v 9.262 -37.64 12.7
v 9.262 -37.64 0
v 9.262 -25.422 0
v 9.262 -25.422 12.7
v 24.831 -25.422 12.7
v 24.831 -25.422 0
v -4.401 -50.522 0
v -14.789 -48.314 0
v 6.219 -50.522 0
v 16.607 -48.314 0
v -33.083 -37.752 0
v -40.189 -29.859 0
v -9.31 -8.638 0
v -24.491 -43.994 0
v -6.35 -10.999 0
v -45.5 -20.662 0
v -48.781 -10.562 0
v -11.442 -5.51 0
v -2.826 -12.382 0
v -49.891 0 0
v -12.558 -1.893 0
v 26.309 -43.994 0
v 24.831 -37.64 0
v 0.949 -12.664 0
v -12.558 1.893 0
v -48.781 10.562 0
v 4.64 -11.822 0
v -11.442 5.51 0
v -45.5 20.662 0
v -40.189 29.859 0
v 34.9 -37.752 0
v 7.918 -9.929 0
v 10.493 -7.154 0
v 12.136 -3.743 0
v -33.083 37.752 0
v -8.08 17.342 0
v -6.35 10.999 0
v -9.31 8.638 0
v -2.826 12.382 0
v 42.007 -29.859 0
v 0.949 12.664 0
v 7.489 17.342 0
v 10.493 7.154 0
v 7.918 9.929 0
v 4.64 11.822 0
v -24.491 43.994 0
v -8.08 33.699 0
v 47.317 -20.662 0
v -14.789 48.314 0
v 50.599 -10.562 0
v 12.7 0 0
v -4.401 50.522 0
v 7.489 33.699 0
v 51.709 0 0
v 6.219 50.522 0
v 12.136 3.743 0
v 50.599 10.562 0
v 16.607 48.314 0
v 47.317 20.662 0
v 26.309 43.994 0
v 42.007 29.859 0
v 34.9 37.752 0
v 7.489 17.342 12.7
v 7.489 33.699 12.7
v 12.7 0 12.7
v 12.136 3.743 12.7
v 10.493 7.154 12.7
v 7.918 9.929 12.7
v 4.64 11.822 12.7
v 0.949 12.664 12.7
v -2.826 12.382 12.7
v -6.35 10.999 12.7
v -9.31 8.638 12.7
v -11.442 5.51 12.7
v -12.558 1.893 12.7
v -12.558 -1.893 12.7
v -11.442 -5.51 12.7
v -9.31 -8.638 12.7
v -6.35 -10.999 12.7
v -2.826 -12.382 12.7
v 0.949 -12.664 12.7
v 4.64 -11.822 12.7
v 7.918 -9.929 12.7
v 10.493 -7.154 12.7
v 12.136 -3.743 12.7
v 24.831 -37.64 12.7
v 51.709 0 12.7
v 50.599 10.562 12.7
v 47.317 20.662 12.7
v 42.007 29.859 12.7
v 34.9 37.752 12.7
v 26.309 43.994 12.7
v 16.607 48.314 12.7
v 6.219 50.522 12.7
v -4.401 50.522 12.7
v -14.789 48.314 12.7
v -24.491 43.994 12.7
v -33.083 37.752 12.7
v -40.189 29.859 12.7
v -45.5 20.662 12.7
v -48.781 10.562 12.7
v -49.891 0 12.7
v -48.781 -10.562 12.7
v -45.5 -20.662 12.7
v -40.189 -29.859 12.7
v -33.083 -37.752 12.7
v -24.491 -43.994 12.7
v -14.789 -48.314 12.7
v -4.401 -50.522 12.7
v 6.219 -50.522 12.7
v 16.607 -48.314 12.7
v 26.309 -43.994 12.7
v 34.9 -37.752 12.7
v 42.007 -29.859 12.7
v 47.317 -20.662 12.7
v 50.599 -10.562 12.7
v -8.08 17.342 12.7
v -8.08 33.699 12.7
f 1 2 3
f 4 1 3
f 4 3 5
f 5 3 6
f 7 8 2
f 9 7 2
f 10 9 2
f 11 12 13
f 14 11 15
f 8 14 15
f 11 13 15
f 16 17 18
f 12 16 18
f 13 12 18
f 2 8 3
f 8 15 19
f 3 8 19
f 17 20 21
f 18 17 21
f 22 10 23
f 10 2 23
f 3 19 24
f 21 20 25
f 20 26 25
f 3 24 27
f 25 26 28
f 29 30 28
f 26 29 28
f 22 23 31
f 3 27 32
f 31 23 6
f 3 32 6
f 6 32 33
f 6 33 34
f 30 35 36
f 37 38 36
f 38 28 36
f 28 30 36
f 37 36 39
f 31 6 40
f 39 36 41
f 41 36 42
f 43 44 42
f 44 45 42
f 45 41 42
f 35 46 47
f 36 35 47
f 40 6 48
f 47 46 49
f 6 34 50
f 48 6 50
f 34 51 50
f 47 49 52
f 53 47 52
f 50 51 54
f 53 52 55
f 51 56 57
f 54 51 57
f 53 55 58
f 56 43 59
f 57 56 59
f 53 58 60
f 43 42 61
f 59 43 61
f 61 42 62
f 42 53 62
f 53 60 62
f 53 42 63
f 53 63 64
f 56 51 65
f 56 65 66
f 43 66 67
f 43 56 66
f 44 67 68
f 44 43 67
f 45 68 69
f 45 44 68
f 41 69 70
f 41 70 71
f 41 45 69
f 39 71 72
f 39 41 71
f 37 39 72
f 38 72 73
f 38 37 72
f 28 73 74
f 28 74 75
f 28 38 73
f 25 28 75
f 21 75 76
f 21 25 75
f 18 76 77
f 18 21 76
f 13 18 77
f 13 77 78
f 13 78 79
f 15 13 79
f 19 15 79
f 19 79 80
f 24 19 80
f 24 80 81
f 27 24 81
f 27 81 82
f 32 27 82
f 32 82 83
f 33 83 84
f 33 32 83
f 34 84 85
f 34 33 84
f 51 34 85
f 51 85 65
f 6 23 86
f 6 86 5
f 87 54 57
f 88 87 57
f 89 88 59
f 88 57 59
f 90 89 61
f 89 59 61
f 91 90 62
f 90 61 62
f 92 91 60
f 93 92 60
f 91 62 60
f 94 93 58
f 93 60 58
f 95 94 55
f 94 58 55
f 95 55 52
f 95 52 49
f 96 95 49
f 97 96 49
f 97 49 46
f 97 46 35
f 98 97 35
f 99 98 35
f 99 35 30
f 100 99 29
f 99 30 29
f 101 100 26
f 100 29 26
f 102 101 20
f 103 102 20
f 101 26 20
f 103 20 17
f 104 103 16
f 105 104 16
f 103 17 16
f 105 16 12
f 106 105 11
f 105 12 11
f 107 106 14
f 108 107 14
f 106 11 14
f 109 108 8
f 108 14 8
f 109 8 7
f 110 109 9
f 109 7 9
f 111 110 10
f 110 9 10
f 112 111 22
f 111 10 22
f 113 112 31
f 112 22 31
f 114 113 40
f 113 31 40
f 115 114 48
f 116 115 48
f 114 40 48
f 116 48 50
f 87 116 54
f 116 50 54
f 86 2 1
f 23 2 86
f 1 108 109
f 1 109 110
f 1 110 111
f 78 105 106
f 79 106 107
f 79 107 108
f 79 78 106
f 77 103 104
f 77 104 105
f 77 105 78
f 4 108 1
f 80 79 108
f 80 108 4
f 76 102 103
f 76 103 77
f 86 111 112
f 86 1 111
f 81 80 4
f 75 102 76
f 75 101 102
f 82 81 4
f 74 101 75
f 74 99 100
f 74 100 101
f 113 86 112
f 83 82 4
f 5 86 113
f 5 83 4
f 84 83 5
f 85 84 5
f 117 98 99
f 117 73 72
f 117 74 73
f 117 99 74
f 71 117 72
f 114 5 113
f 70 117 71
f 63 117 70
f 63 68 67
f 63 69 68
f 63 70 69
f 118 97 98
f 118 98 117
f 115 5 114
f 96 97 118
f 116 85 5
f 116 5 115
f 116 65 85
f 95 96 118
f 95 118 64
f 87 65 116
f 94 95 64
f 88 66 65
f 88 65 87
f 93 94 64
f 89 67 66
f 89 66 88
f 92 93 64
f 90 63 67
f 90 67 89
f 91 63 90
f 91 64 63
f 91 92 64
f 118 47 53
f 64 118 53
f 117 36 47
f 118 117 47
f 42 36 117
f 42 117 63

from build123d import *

# Parameters (mm, degrees)
F0_R     = 50.8
F0_R_2   = 12.7
F0_W     = 15.568451
F0_H     = 12.218274
F0_W_2   = 15.568449
F0_H_2   = 16.356724
F1_DEPTH = 12.7


with BuildPart() as f1:
    # F0 (on Top) → F1 (new body)
    with BuildSketch(Plane.XY):
        with Locations((0.908604, 0)):
            Circle(F0_R)
        Circle(F0_R_2, mode=Mode.SUBTRACT)
        with Locations((17.046467, -31.531036)):
            Rectangle(F0_W, F0_H, mode=Mode.SUBTRACT)
        with Locations((-0.295603, 25.520432)):
            Rectangle(F0_W_2, F0_H_2, mode=Mode.SUBTRACT)
    extrude(amount=F1_DEPTH)


solid = f1.part
